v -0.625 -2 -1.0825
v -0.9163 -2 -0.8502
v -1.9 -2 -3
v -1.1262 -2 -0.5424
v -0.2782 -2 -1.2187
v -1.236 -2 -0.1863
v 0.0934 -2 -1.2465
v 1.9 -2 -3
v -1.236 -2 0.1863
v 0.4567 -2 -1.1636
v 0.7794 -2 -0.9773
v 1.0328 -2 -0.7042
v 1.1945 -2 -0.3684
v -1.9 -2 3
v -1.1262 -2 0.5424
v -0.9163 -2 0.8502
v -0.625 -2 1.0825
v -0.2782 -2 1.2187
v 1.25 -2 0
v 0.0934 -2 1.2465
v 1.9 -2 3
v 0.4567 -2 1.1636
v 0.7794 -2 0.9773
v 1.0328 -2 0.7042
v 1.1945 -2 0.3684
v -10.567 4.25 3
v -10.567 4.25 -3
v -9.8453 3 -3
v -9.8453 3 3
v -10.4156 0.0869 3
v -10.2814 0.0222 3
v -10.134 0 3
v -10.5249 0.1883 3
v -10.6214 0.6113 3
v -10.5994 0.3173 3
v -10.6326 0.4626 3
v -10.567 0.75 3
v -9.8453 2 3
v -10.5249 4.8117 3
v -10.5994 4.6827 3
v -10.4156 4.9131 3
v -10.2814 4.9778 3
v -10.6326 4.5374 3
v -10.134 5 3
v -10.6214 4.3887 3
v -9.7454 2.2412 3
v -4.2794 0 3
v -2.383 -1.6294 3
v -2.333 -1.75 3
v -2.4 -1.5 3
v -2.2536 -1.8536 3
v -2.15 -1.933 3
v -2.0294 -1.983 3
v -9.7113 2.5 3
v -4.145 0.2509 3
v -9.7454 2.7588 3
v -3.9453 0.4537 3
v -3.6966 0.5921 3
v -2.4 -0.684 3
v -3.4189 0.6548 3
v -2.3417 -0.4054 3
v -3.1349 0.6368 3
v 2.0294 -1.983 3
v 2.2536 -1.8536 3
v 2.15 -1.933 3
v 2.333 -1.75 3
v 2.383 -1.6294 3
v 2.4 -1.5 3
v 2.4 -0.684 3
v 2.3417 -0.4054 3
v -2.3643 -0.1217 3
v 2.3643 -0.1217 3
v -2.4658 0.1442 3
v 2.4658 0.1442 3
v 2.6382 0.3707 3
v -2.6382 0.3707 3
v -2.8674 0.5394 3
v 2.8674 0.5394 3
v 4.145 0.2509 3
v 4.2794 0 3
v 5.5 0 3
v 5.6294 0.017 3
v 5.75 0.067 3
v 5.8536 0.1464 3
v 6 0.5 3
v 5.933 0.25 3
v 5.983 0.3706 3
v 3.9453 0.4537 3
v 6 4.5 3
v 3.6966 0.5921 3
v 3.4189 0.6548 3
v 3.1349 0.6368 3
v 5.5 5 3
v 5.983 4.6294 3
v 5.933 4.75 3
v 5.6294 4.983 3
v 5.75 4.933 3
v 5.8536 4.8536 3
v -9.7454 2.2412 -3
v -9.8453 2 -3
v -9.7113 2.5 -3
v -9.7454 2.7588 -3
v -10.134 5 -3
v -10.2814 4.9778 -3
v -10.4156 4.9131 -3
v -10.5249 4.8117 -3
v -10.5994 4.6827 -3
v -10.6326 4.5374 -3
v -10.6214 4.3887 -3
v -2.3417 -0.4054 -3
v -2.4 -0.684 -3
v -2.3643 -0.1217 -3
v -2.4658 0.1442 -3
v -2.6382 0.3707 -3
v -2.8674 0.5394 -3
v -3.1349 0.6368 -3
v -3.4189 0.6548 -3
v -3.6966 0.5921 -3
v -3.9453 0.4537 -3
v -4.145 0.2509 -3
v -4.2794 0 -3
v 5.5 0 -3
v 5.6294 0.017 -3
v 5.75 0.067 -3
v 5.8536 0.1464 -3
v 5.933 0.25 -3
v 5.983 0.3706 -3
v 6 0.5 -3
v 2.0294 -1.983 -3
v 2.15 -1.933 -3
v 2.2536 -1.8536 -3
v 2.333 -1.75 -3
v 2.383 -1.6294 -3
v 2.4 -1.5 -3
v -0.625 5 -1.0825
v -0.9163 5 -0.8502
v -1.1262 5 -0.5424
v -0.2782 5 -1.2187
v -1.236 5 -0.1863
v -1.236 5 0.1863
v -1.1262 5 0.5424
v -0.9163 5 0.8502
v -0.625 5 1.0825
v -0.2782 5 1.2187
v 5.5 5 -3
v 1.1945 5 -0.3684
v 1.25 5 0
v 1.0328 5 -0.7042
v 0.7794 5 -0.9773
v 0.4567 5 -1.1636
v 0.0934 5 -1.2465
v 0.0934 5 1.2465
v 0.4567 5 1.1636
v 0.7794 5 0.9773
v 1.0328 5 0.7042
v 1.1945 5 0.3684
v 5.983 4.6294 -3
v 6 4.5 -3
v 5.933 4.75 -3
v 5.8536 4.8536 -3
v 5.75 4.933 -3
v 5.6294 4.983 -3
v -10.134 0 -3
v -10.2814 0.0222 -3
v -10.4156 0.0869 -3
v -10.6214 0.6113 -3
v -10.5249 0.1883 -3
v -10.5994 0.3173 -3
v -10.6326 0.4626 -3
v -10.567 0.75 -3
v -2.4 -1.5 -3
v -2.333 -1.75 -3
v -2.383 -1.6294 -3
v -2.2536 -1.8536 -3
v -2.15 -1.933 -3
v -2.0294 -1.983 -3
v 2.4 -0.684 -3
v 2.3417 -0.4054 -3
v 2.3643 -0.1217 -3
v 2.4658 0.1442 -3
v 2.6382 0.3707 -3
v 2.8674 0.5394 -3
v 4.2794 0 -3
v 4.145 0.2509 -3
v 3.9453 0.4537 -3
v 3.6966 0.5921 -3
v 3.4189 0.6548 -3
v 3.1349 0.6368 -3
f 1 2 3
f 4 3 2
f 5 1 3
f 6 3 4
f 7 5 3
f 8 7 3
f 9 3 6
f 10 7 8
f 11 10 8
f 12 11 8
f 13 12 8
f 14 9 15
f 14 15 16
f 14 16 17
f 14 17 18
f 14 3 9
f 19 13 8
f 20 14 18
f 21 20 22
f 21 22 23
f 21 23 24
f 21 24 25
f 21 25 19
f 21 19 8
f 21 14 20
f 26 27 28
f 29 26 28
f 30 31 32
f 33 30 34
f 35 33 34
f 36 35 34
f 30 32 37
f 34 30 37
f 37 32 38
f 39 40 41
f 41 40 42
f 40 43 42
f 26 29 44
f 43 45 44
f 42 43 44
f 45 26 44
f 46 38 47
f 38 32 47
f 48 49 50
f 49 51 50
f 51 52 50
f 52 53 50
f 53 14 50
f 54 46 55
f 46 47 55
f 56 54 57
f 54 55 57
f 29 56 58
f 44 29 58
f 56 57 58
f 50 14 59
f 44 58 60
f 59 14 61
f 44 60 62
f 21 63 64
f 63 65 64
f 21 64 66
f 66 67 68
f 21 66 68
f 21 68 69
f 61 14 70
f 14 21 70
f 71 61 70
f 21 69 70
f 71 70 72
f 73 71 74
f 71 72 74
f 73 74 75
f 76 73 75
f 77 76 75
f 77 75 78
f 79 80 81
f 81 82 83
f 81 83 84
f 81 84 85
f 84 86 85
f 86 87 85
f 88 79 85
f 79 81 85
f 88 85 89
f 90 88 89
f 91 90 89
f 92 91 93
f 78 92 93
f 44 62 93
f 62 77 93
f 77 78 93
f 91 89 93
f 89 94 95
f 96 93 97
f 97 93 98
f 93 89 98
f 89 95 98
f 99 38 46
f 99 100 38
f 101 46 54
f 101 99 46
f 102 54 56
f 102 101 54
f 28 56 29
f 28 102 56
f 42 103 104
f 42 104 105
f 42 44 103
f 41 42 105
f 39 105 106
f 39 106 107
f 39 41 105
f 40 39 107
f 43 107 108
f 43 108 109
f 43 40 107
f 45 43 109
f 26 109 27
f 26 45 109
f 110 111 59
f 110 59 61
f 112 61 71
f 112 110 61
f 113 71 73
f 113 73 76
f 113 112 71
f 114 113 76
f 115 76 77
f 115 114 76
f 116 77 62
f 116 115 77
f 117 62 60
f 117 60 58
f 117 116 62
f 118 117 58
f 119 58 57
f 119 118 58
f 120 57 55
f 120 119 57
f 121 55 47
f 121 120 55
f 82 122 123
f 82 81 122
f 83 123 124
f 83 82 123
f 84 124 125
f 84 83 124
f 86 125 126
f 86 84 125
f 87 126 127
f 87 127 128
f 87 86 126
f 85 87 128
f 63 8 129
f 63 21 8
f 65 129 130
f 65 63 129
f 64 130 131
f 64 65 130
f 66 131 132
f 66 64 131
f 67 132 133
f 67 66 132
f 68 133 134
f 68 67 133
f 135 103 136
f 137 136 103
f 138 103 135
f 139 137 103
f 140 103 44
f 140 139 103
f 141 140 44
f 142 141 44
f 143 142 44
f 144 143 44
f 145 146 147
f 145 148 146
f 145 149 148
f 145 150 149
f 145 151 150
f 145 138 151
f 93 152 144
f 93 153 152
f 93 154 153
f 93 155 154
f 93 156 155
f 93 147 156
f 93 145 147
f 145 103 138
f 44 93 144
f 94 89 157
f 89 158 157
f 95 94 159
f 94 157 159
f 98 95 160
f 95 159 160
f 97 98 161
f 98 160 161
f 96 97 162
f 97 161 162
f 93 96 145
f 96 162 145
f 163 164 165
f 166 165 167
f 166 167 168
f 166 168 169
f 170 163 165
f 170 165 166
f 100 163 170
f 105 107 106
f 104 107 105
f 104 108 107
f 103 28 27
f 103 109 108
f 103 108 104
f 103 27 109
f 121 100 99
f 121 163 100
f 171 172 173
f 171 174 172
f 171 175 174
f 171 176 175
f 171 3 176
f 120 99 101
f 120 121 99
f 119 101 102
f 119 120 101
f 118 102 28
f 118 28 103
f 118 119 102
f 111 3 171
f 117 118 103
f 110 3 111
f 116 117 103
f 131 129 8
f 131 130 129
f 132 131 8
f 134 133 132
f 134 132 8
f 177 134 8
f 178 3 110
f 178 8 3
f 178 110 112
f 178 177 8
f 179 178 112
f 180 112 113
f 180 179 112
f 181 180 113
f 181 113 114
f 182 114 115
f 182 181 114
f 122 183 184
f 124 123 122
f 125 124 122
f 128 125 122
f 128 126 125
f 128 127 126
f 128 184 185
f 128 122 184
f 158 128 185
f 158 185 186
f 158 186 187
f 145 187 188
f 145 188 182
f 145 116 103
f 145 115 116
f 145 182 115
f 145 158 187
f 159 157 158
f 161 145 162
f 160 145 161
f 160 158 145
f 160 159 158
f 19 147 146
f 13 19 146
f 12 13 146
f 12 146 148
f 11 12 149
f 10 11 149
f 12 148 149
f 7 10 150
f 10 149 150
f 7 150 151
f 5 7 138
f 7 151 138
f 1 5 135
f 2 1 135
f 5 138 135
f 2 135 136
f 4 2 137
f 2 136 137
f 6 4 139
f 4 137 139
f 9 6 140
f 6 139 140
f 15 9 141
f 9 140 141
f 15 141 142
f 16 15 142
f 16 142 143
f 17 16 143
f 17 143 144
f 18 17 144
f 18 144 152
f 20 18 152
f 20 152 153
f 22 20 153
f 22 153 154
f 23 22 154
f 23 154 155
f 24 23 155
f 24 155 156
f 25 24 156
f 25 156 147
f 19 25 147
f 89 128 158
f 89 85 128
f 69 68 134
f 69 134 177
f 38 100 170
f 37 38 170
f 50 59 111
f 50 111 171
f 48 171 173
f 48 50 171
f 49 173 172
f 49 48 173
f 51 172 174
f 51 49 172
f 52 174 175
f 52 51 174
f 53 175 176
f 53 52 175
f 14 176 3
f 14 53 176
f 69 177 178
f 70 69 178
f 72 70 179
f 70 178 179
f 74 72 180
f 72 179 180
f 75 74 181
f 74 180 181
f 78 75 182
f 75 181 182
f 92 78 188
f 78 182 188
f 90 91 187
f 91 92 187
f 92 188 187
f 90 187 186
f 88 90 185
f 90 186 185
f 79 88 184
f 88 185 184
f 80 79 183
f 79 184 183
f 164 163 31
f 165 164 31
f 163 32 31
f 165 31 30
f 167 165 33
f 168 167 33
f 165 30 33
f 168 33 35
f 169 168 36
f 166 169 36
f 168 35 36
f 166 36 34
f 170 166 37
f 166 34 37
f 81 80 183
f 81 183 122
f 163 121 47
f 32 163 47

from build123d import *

# Parameters (mm, degrees)
BOSS_EXTRU_1_DEPTH      = 3
ESQUISSE2_R             = 1.25
ENL_V_MAT_EXTRU_1_DEPTH = 8
ESQUISSE3_W             = 6
ESQUISSE3_H             = 5
BOSS_EXTRU_2_DEPTH      = 5
ENL_V_MAT_EXTRU_3_DEPTH = 7
CONG_4_R                = 0.5
CONG_5_R                = 1
ENL_V_MAT_EXTRU_5_DEPTH = 7


with BuildPart() as part:
    # Esquisse1 → Boss.-Extru.1 (new body, symmetric)
    with BuildSketch(Plane.XY):
        Polygon((-6, 0), (-2.4, 0), (-2.4, -2), (2.4, -2), (2.4, 0), (6, 0), (6, 5), (-6, 5), align=None)
    extrude(amount=BOSS_EXTRU_1_DEPTH, both=True)

    # Esquisse2 → Enlèv. mat.-Extru.1 (cut, through all)
    with BuildSketch(Plane(origin=(0, 5, 0), x_dir=(1, 0, 0), z_dir=(0, 1, 0))):
        Circle(ESQUISSE2_R)
    extrude(amount=-ENL_V_MAT_EXTRU_1_DEPTH, mode=Mode.SUBTRACT)

    # Esquisse3 → Boss.-Extru.2 (add)
    with BuildSketch(Plane.ZY.offset(6)):
        with Locations((0, 2.5)):
            Rectangle(ESQUISSE3_W, ESQUISSE3_H)
    extrude(amount=BOSS_EXTRU_2_DEPTH)

    # Esquisse7 → Enlèv. mat.-Extru.3 (cut, through all)
    with BuildSketch(Plane.XY.offset(3)):
        Polygon((-11, 5), (-9.556624327, 2.5), (-11, 0), align=None)
    extrude(amount=-ENL_V_MAT_EXTRU_3_DEPTH, mode=Mode.SUBTRACT)

    # Congé4
    cong_4_edges = [part.edges().sort_by_distance(p)[0] for p in [
        (6, 0, 0),
        (2.4, -2, 0),
        (-2.4, -2, 0),
        (6, 5, 0),
        (-11, 0, 0),
        (-11, 5, 0),
    ]]
    fillet(cong_4_edges, radius=CONG_4_R)

    # Congé5
    cong_5_edges = [part.edges().sort_by_distance(p)[0] for p in [
        (-9.556624327, 2.5, 0),
    ]]
    fillet(cong_5_edges, radius=CONG_5_R)

    # Esquisse12 → Enlèv. mat.-Extru.5 (cut, through all)
    with BuildSketch(Plane(origin=(0, 0, -3), x_dir=(-1, 0, 0), z_dir=(0, 0, -1))):
        with BuildLine():
            Line((-4.279385242, 0), (-2.4, -0.684040287))
            ThreePointArc((-2.4, -0.684040287), (-2.997672477, 0.597672477), (-4.279385242, 0))
        make_face()
        with BuildLine():
            Line((4.279385242, 0), (2.4, -0.684040287))
            ThreePointArc((2.4, -0.684040287), (2.997672477, 0.597672477), (4.279385242, 0))
        make_face()
    extrude(amount=-ENL_V_MAT_EXTRU_5_DEPTH, mode=Mode.SUBTRACT)


solid = part.part
